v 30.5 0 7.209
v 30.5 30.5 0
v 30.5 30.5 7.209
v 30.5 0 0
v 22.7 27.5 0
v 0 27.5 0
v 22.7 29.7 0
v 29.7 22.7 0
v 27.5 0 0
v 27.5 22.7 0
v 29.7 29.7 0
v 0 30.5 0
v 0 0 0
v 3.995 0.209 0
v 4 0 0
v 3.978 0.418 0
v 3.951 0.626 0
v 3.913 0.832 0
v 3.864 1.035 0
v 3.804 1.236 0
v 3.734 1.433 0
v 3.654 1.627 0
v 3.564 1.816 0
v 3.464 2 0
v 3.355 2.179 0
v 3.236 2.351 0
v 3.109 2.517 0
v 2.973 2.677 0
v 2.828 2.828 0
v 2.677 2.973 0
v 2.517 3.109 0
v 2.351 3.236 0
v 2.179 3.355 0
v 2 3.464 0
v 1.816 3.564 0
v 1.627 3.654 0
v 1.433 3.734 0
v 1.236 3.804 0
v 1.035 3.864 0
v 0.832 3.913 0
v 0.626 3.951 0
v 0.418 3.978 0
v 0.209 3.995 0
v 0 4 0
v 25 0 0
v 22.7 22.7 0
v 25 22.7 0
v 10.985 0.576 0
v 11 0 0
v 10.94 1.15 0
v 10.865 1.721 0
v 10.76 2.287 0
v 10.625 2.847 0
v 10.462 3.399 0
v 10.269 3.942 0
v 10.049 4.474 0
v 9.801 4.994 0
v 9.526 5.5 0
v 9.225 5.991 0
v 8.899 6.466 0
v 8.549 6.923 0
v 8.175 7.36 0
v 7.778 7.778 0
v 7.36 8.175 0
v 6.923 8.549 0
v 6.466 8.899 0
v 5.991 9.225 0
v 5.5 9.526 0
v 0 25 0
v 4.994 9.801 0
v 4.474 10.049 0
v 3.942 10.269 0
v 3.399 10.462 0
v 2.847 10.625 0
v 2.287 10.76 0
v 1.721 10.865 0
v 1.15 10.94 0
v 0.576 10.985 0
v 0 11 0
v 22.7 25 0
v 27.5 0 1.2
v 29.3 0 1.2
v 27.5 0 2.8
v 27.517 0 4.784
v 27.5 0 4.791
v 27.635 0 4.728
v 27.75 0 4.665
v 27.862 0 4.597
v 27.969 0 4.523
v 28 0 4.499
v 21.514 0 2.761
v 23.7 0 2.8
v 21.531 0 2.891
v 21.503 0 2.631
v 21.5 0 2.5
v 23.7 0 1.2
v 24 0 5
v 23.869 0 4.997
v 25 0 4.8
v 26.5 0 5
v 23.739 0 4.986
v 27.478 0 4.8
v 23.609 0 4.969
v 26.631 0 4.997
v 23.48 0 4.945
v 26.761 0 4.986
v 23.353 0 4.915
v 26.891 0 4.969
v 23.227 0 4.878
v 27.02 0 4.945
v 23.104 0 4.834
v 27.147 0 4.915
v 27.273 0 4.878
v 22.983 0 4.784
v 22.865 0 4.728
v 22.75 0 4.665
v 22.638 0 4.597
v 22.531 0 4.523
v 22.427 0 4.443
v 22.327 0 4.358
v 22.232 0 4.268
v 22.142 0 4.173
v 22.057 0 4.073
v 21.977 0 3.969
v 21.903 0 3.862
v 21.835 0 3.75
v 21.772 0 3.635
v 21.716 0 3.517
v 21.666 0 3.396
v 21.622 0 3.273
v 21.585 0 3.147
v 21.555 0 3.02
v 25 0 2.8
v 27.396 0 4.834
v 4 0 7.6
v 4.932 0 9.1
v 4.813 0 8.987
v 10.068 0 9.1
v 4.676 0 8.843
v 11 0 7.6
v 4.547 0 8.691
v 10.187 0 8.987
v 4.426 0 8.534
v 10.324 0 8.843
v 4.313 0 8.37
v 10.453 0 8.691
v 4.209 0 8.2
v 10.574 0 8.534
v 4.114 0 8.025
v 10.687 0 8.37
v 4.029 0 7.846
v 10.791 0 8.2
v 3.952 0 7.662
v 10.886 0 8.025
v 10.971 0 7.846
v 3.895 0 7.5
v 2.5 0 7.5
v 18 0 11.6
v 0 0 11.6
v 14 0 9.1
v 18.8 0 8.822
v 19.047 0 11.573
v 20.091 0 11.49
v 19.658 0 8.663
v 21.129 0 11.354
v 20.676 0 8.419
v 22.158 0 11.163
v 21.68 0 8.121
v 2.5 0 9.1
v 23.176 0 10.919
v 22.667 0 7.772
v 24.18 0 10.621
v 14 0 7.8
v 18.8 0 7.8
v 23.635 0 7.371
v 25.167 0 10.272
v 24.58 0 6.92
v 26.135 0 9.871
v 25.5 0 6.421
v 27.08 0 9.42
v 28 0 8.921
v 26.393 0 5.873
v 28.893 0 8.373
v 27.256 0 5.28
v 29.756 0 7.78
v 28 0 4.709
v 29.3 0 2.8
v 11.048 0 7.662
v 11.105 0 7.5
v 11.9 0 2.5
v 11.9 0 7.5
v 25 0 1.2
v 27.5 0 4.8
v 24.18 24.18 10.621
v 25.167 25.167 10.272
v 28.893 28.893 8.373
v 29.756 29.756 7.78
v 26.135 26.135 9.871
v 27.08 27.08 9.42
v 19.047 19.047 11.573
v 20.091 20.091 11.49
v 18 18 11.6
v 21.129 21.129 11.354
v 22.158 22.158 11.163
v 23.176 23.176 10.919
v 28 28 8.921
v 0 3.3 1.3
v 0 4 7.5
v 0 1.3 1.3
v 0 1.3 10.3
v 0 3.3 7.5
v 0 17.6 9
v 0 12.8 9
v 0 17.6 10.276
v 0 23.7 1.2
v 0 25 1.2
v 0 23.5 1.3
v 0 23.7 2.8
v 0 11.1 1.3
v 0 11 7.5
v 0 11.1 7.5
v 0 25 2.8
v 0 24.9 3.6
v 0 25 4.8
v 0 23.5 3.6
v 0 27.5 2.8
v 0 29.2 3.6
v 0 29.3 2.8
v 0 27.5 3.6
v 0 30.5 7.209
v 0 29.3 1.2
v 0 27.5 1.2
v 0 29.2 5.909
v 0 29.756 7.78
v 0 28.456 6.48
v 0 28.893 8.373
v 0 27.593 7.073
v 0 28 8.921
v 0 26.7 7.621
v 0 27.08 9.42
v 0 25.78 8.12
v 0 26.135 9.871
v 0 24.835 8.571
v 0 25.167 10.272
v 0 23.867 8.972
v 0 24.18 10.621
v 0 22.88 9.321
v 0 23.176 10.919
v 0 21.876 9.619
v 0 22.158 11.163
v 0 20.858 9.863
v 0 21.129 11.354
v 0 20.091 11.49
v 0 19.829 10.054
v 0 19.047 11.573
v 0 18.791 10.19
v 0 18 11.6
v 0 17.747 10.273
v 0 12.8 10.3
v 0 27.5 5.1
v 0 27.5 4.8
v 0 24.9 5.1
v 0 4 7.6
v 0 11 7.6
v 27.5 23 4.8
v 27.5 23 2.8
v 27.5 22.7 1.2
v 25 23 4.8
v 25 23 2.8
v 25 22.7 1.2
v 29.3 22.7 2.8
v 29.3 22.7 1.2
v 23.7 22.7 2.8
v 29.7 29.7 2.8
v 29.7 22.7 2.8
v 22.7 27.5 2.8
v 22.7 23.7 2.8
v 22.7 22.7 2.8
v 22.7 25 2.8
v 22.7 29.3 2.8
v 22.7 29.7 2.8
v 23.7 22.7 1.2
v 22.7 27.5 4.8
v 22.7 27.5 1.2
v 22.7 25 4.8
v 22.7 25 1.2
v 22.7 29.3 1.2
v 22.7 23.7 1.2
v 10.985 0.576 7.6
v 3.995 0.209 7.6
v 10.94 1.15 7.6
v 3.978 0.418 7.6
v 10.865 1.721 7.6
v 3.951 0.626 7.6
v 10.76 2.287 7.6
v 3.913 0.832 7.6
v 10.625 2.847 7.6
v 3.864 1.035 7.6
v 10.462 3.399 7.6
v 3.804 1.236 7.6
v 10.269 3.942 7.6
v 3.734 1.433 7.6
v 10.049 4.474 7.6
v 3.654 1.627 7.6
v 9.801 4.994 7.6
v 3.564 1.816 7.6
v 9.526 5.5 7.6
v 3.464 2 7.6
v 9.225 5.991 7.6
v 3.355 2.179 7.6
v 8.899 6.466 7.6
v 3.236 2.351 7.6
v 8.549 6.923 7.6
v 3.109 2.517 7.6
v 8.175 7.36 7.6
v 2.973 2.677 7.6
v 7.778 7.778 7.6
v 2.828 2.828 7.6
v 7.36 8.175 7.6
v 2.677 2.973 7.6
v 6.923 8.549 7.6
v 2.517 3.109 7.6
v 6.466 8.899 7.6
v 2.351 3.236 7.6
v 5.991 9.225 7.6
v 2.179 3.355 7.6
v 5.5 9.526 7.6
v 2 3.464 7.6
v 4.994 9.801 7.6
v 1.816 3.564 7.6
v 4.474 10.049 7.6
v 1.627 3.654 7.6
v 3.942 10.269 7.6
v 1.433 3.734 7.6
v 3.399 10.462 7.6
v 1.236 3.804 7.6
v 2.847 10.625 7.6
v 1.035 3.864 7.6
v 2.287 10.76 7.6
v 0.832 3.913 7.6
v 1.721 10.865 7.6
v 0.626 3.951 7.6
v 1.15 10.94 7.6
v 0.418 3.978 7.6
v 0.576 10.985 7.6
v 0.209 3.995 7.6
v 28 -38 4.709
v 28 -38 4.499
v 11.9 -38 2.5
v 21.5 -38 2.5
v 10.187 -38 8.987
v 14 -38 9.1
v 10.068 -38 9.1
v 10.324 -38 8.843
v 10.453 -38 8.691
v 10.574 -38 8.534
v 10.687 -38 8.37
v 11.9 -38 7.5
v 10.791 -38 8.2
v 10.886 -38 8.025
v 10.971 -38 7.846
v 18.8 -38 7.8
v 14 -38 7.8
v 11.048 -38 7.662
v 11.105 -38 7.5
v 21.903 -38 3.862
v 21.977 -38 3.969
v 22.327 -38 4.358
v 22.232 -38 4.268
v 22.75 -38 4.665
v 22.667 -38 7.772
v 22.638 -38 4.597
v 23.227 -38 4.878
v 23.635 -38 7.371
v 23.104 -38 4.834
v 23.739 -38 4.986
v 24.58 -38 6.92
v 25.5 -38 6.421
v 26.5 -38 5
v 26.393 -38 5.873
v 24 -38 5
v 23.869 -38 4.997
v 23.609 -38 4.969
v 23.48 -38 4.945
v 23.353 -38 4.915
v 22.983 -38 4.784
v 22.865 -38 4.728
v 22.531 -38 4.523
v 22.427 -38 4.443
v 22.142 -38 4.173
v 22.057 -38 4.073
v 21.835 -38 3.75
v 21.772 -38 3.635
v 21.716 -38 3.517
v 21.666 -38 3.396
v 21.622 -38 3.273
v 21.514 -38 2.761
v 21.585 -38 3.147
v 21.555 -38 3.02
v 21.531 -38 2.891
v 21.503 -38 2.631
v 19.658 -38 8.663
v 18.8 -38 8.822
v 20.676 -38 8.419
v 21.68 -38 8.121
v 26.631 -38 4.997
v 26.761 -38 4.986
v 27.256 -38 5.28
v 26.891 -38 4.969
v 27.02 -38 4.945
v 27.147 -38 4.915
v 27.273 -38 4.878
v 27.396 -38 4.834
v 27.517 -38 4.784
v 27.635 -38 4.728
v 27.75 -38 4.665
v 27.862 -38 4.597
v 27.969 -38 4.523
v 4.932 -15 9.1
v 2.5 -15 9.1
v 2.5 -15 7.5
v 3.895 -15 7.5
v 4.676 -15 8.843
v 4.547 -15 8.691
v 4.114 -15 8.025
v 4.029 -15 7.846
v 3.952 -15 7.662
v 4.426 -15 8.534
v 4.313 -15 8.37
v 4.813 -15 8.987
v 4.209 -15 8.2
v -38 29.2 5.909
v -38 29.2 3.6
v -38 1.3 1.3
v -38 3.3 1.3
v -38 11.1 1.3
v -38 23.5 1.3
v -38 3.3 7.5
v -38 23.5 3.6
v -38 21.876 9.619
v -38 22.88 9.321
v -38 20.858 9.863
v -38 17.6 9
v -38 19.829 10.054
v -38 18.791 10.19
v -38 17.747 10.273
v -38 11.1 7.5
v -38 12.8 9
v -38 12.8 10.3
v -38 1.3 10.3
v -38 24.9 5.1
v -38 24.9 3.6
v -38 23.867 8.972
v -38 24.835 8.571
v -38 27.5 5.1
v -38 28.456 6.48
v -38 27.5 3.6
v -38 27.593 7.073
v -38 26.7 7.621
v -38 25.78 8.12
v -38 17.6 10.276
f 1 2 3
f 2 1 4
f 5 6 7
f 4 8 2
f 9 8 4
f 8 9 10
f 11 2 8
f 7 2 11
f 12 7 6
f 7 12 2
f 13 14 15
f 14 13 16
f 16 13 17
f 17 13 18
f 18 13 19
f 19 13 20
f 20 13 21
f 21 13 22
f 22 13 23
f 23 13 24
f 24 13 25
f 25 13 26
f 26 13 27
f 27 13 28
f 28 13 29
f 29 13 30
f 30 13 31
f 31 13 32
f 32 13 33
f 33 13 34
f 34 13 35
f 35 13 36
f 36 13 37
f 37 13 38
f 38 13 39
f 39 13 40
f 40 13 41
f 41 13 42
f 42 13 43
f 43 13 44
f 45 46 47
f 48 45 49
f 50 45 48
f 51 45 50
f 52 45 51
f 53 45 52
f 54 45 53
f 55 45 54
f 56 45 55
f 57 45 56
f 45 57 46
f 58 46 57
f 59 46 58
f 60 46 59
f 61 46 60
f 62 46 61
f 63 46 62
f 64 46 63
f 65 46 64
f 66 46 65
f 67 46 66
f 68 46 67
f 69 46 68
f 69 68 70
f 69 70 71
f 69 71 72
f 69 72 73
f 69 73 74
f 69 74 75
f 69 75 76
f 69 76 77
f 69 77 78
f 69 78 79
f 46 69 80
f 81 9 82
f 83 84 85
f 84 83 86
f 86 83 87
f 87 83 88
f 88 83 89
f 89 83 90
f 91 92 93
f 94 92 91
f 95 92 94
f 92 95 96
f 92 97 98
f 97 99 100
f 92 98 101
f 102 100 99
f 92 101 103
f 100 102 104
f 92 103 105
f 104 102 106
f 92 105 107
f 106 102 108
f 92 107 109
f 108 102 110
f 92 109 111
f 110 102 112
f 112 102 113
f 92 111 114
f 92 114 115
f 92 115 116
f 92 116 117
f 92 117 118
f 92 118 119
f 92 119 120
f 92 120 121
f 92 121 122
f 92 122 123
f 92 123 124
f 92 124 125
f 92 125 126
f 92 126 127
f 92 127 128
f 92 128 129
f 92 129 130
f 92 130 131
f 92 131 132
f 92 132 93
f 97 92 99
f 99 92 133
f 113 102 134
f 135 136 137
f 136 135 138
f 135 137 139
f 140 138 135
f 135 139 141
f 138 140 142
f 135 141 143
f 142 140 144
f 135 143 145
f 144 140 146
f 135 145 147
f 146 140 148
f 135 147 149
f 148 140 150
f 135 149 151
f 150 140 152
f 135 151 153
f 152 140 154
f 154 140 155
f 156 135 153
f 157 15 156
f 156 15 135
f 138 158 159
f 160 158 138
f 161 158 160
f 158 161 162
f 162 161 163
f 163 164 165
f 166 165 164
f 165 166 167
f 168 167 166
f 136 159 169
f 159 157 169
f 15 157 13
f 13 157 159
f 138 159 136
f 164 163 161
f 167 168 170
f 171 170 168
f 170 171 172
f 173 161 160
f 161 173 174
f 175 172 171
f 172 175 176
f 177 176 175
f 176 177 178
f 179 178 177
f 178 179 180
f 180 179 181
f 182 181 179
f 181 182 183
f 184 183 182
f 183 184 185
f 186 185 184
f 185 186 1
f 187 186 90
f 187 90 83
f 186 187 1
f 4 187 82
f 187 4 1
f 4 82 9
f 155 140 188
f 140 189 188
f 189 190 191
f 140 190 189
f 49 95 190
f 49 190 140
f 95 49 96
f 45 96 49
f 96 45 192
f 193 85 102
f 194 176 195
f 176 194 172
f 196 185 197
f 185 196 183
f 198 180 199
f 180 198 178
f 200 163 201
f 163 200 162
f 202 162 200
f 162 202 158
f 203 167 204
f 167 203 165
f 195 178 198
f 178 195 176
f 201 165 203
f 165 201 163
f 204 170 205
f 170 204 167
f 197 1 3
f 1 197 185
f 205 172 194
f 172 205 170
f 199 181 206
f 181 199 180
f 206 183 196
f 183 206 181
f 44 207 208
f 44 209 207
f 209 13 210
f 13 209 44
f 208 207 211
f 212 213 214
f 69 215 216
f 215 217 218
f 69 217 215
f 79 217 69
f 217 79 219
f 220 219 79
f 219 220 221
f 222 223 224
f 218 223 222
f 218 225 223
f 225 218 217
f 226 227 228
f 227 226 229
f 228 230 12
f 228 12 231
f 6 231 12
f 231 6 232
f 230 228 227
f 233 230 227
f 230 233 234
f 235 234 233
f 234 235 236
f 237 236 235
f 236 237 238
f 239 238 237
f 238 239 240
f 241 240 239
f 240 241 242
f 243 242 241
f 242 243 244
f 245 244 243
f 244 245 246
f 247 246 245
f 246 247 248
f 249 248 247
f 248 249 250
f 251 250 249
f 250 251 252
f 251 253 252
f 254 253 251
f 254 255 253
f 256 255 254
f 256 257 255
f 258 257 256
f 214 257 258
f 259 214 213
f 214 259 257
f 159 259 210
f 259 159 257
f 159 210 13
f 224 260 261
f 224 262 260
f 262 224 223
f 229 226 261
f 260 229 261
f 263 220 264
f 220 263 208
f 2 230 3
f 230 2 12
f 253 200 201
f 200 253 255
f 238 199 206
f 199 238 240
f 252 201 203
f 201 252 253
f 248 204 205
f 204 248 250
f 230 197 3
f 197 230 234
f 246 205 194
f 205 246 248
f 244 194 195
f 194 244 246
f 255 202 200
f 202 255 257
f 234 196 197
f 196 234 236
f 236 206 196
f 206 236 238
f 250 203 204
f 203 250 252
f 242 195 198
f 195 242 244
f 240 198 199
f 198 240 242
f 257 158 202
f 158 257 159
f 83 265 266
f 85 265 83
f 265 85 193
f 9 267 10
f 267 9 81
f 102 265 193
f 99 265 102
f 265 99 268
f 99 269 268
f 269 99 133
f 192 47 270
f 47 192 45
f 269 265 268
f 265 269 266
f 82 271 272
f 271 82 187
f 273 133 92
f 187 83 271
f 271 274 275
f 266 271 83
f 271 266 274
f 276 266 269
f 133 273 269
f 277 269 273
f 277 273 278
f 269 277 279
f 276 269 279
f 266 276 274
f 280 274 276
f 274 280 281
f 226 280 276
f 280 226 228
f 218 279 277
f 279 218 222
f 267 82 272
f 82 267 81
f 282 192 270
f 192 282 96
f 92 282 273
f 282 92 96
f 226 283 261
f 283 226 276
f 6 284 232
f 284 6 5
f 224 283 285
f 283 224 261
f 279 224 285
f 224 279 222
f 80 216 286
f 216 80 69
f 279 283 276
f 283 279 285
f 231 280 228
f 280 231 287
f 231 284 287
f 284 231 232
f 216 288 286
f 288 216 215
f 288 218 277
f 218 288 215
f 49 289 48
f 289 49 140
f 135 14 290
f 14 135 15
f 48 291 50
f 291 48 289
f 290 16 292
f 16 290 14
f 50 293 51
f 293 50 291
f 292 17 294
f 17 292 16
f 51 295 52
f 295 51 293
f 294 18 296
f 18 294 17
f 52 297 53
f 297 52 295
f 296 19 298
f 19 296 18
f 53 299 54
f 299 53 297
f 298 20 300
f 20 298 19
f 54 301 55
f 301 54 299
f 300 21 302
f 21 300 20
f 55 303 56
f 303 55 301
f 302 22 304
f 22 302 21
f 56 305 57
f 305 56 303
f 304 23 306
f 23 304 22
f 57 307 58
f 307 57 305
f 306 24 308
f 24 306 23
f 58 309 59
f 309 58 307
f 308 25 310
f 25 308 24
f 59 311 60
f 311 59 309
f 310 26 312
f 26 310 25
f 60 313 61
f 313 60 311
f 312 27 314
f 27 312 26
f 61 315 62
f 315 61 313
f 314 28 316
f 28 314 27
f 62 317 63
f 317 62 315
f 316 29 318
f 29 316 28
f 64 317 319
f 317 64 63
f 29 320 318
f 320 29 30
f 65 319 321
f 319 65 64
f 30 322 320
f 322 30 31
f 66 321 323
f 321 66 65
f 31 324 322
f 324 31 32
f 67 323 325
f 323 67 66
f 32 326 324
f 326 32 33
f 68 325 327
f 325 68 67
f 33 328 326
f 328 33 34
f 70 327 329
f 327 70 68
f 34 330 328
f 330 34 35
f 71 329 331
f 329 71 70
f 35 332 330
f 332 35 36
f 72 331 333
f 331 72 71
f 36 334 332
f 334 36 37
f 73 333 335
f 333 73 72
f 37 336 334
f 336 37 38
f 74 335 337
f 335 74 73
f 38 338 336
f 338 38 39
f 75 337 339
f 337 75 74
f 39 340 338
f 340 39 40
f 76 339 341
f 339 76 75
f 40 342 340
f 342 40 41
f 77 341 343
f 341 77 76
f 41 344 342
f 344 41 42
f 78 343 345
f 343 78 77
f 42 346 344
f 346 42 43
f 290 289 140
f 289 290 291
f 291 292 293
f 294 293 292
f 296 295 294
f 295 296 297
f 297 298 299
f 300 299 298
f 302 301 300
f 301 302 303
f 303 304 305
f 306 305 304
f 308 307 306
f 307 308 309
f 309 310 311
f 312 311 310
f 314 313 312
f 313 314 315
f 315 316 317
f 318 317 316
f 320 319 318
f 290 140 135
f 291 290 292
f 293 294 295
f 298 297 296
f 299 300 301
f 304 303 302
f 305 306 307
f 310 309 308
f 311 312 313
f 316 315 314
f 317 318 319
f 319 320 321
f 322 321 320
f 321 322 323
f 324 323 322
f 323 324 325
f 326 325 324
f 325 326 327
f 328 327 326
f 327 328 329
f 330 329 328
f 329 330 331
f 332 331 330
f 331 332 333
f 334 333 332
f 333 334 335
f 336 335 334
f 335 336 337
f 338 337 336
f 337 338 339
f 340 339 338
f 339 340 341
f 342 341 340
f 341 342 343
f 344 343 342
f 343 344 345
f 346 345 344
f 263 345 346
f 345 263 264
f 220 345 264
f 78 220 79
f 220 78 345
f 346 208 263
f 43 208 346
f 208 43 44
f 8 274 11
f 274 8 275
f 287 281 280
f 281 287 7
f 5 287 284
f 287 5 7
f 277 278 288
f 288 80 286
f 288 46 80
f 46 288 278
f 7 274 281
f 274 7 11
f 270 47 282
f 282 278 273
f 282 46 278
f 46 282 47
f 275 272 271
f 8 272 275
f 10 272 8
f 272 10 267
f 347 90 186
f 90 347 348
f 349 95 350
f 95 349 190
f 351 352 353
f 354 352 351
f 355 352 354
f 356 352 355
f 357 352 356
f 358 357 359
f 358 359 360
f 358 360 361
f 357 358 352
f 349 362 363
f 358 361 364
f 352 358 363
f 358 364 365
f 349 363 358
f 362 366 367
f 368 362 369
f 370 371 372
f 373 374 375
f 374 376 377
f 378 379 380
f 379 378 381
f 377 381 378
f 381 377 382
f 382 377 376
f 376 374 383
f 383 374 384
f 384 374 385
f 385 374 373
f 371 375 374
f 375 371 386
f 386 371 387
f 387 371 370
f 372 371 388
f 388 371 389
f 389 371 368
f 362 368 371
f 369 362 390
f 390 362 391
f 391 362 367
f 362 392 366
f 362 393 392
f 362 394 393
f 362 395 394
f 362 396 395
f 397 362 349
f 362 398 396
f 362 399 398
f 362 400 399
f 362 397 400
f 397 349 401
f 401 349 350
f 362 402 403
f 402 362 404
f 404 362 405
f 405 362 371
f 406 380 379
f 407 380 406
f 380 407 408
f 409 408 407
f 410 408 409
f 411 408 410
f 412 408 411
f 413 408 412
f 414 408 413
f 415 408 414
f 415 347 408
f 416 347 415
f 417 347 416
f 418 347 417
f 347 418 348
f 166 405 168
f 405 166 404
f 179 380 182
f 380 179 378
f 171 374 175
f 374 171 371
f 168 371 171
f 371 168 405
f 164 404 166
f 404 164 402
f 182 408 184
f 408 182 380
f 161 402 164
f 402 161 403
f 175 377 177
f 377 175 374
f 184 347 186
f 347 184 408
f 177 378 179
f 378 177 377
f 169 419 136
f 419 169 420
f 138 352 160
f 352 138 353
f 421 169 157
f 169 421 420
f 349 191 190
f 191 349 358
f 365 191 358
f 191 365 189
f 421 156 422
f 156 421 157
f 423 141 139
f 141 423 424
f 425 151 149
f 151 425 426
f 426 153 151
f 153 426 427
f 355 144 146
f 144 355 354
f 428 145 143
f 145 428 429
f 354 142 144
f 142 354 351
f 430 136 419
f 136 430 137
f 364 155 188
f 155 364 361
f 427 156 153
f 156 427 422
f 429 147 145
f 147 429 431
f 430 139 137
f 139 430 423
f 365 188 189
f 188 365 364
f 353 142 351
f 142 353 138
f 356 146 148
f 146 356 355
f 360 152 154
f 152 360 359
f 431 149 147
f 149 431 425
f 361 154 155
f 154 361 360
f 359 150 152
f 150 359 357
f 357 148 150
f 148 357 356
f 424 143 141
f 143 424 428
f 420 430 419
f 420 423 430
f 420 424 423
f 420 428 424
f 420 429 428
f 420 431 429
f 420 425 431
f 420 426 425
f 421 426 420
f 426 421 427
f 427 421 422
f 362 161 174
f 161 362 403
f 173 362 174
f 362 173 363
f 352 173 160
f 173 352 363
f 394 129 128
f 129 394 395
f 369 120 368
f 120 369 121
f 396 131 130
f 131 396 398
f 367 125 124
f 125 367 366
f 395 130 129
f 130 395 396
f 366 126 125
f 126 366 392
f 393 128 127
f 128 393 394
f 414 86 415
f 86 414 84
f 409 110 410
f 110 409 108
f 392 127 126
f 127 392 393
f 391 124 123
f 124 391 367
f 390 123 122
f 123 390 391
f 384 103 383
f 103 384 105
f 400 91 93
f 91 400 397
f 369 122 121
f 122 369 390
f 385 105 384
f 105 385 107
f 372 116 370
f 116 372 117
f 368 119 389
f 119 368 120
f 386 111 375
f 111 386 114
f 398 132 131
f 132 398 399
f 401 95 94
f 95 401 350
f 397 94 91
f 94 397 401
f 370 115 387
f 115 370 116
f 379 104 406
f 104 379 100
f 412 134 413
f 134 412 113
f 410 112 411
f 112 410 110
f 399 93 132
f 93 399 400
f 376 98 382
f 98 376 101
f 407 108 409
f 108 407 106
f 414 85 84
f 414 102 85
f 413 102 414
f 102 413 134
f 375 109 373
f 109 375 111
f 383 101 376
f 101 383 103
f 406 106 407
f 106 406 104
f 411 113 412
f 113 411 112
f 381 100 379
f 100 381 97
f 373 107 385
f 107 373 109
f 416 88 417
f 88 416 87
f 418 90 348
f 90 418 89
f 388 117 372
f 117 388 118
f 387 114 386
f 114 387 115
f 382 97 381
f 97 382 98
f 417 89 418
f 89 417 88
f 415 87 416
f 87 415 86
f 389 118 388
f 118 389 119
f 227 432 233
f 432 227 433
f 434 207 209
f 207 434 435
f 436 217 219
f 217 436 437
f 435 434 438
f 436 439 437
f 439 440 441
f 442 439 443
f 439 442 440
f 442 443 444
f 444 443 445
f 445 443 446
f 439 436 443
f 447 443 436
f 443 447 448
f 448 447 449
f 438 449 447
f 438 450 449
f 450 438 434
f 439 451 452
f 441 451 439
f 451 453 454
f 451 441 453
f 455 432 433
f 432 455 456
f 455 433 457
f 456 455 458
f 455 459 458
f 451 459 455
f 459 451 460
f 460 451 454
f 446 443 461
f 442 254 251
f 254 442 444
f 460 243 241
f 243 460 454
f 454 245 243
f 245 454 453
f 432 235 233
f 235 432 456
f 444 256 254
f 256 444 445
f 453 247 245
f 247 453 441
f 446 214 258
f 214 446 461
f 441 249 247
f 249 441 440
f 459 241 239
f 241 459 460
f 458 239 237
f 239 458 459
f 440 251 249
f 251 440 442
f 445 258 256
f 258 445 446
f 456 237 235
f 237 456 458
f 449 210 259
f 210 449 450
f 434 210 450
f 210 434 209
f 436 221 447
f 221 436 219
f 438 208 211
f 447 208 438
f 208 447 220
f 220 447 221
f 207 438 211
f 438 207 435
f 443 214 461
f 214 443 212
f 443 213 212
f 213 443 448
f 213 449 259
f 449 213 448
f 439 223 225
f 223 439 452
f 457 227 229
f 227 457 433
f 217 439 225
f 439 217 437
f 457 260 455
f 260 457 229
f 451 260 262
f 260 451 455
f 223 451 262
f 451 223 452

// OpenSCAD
//
// mensi cast 18x18mm
cp1 = 30.5;
roh1 = 18;
vroh1 = 11.6;
oble = 40;
delkavnej = 38;
$fn=120;

module tesneni(delka) {
    // profil pro tesneni cast1 (sirka 2.5 vyska 4.8 offset_x 25 )
    translate([1.3,0,0]) cube([2.5,delka,4.8]);
    // profil pro tesneni cast2 (sirka 5.6 vyska 1.6 offset_x 23.7 offset_z 1.2)  
    translate([0,0,1.2]) cube([5.6,delka,1.6]);
}

module centralpart () {
 difference() {
  union() {  
  cube([roh1,roh1,vroh1]);
  intersection(){
       translate([roh1,0,0]) cube([cp1-roh1,cp1,vroh1]);
       translate([roh1,0,vroh1-oble/2]) rotate([270,0,0]) cylinder(d=oble,h=roh1);
      }
  intersection(){
       translate([0,roh1,0]) cube([cp1,cp1-roh1,vroh1]);
       translate([0,roh1,vroh1-oble/2]) rotate([180,270,0]) cylinder(d=oble,h=roh1);
      }
  intersection(){
       translate([roh1,roh1,0]) cube([cp1-roh1,cp1-roh1,vroh1]);
       translate([roh1,roh1,vroh1-oble/2]) rotate([180,270,0]) cylinder(d=oble,h=roh1);
       translate([roh1,roh1,vroh1-oble/2]) rotate([270,0,0]) cylinder(d=oble,h=roh1);
      }
  } // plna cast
  union() { 
    // zahnuty profil vnitrni d=4 vnejsi d=10 stred je roh ctverce
    rotate_extrude(angle = 90) translate([4,0]) square(size = [7, 7.6], center = [10,0,0]);
    // tesneni jednim smerem
    translate([23.7,0,0]) tesneni(cp1-7.5);  
    // tesneni druhym smerem
    rotate([0,0,90]) translate([23.7,-22.7,0]) tesneni(cp1-7.5);  
    // vkladaci otvor
    translate([22.7,22.7,0]) cube([7,7,2.8]);  
  } // vyrezy    
 } // difference
}  

module vnejsiprofil() {
  offset=1.3;  
  translate([offset,0,offset]) 
   difference() {
    union() { 
    cube([roh1-2*offset,delkavnej,vroh1-2*offset]);  
    intersection(){
      translate([roh1-2*offset,0,0]) cube([cp1-roh1,delkavnej,vroh1]);
      translate([roh1-2*offset,0,vroh1-oble/2-2*offset]) rotate([270,0,0]) cylinder(d=oble,h=delkavnej);
     }
    } // hlavni cast   
    union() {
      // velky vyrez
      translate([2.0,0,0]) cube([7.8,delkavnej,6.2]);  
      // drazka pro uchycovaci pasek  
      translate([11.5,0,vroh1-3*offset]) cube([4.8,delkavnej,1.3]);  
      // drazky v prostoru tesneni
      translate([22.2,0,0]) cube([7.0,delkavnej,2.3]);  
      translate([23.6,0,0]) cube([2.6,delkavnej,3.8]);  
    } // odebirane casti
  } // difference 
}

module vnitrniprofil() {
    offset=2.5;
    translate([offset,0,offset]) 
    difference() {
    union() { cube([roh1-2*offset,delkavnej,vroh1-2*offset]);  
              intersection(){
                 translate([roh1-2*offset,0,0]) cube([cp1-roh1,delkavnej,vroh1]);
                 translate([roh1-2*offset,0,vroh1-oble/2-2*offset]) rotate([270,0,0]) cylinder(d=oble,h=delkavnej);
                }
            }
    union() {
      // velky vyrez
      translate([-1.6,0,-1]) cube([11,delkavnej,6]);  
      translate([5,0,3.8]) rotate([270,0,0]) cylinder(d=7.6,h=delkavnej);  
      translate([0,-15,3]) cube([4,delkavnej,6]); 
      // drazka pro uchycovaci pasek  
      translate([11.5,0,vroh1-2*offset-1.3]) cube([4.8,delkavnej,1.3]);  
      // vybrani u spicky dva valce d=5 a mezi stredy vzdalenost 2.5 fce hull
      translate([cp1-9,0,0]) rotate([270,0,0]) hull() { 
         cylinder(d=5, h=delkavnej);
         translate([2.5,0,0]) cylinder(d=5, h=delkavnej);
        }  
    } // odebirane casti
  } // difference          
}

centralpart();
translate([0,-delkavnej,0]) vnitrniprofil();
translate([0,0,0]) rotate([0,0,90]) vnejsiprofil();
// tesneni(delkavnej);
//vnitrniprofil();
